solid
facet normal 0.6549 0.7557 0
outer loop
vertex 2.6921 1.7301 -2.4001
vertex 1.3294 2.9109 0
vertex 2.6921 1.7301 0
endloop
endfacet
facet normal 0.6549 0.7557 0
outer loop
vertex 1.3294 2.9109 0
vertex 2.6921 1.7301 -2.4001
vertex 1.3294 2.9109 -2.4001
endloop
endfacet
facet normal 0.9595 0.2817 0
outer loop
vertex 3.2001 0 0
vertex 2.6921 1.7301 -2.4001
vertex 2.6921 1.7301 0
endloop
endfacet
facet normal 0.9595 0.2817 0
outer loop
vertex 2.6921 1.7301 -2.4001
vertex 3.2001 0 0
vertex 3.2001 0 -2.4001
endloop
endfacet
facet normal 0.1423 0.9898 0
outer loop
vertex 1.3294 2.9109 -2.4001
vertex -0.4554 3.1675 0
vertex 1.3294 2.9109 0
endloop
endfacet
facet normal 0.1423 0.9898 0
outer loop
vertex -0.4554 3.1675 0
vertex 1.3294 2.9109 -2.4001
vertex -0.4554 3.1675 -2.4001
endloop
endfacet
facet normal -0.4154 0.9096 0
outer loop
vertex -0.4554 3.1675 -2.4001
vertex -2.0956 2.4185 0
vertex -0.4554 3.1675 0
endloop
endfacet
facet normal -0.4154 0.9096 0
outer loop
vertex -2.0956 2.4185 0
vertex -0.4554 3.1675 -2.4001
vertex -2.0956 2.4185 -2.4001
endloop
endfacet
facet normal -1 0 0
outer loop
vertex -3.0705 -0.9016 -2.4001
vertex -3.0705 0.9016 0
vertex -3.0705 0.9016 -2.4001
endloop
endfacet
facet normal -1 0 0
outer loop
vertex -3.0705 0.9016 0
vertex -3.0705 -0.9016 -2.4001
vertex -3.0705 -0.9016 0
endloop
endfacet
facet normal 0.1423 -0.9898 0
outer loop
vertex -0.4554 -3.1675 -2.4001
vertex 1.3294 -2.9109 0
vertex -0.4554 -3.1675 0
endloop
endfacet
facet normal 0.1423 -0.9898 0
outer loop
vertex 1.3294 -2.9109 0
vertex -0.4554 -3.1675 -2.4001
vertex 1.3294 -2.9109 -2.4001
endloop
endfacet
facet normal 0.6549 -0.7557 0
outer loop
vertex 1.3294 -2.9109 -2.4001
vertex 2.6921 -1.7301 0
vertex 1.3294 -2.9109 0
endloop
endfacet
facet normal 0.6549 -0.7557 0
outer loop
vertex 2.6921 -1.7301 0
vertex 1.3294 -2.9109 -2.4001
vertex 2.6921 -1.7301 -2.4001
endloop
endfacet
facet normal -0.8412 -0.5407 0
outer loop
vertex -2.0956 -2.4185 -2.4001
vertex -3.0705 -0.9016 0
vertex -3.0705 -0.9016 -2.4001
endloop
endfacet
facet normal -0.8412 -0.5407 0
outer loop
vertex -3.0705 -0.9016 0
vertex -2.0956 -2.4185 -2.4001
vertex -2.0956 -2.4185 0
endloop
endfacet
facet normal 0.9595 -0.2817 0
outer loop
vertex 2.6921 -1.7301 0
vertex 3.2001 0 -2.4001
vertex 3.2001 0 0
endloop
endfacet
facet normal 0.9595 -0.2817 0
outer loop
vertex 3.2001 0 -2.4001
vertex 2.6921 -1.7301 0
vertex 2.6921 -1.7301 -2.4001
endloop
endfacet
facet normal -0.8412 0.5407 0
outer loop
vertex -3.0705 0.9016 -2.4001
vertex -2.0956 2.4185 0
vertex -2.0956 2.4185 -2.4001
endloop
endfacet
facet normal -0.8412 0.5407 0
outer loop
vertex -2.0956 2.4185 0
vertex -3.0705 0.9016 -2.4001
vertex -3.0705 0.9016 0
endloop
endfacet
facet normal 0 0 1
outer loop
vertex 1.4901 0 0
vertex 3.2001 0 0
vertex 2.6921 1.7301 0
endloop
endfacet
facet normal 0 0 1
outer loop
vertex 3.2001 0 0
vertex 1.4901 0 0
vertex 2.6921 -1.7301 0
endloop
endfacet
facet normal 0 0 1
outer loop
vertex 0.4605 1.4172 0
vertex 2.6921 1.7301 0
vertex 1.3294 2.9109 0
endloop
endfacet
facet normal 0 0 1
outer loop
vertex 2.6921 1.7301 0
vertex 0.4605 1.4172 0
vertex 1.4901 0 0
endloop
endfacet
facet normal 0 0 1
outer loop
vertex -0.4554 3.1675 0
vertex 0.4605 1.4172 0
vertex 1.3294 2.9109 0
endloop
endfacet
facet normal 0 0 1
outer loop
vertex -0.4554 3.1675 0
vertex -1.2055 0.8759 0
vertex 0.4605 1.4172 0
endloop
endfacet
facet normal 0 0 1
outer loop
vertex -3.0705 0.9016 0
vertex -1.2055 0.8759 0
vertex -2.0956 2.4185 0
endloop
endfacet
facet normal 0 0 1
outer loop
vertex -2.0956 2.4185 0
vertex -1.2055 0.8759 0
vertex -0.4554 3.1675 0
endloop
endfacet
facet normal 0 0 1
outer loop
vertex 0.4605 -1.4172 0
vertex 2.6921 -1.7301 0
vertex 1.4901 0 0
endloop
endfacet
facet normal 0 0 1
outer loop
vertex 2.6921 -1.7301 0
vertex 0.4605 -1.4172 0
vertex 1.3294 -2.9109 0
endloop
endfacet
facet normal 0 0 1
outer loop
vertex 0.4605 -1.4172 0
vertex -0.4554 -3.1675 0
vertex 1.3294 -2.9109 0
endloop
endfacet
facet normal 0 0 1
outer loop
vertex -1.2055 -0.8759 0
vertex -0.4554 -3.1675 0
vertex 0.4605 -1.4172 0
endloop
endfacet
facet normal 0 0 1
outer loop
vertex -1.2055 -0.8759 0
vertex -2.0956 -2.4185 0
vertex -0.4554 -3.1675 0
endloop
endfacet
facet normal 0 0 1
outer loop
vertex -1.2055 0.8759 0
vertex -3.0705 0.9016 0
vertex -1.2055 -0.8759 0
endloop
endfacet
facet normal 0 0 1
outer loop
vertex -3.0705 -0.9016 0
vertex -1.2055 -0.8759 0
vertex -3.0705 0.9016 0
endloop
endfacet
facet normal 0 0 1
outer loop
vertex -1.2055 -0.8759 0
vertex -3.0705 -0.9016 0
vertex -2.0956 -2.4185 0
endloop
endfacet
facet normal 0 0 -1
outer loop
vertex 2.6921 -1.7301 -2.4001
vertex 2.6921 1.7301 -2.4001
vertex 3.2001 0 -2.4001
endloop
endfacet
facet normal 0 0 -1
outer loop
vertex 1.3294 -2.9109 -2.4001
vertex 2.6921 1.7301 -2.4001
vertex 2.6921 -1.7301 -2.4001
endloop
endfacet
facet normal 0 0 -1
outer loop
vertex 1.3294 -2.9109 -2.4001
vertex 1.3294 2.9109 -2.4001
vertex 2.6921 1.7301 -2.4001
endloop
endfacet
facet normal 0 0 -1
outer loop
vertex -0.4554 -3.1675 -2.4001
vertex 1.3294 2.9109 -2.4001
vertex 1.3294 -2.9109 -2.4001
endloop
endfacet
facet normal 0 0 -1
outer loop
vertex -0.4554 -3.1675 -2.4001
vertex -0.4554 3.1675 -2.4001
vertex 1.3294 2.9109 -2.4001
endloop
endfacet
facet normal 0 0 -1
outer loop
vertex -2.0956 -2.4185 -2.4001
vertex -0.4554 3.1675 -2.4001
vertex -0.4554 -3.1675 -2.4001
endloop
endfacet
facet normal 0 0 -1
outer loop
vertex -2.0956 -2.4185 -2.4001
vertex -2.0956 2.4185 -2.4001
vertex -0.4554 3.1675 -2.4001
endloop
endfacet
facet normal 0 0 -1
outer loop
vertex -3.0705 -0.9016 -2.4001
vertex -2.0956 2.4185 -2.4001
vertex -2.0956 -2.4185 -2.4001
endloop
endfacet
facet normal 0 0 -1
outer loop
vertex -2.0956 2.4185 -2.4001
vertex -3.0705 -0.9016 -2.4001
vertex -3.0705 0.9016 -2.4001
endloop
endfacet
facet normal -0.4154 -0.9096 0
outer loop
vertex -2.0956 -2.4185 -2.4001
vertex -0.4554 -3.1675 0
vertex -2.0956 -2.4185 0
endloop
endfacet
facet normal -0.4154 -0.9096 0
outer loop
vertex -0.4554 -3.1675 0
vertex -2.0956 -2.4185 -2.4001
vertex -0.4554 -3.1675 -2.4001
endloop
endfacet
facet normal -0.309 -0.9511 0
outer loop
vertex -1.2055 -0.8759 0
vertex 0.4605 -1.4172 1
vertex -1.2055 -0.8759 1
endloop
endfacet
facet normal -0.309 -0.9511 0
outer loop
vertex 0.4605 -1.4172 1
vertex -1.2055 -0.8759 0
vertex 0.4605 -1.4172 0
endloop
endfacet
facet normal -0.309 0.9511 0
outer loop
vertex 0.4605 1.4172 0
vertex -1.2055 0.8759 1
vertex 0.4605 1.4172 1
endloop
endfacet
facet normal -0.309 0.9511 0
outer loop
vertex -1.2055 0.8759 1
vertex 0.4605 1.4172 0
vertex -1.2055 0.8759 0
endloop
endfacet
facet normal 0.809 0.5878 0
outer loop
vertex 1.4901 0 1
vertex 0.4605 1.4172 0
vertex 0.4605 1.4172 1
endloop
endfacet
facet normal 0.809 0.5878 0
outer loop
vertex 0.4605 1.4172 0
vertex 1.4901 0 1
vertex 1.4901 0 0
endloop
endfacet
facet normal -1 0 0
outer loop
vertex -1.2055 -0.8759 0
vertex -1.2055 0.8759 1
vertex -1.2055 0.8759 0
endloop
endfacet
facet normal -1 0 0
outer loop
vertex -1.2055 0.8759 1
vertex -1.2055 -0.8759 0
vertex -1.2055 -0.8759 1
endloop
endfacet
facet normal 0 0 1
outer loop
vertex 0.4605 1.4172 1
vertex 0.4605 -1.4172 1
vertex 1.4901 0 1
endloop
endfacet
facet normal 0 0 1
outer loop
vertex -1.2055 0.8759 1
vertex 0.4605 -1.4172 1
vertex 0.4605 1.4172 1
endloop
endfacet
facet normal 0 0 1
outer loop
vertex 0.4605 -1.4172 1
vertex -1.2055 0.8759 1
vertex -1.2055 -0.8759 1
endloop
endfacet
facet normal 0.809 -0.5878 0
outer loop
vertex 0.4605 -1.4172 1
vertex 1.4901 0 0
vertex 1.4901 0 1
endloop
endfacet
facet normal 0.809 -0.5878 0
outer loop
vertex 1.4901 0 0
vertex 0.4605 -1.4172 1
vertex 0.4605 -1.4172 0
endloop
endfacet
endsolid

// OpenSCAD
// License: GPL 2.0

//testNutsAndBolts();

module testNutsAndBolts()
{
	$fn = 360;
	translate([0,15])nutHole(3, proj=2);
	boltHole(3, length= 30, proj=2);
}

MM = "mm";
INCH = "inch"; //Not yet supported

//Based on: http://www.roymech.co.uk/Useful_Tables/Screws/Hex_Screws.htm
METRIC_NUT_AC_WIDTHS = 
[
	-1, //0 index is not used but reduces computation
	-1,
	-1,
	6.40,//m3
	8.10,//m4
	9.20,//m5
	11.50,//m6
	-1,
	15.00,//m8
	-1,
	19.60,//m10
	-1,
	22.10,//m12
	-1,
	-1,
	-1,
	27.70,//m16
	-1,
	-1,
	-1,
	34.60,//m20
	-1,
	-1,
	-1,
	41.60,//m24
	-1,
	-1,
	-1,
	-1,
	-1,
	53.1,//m30
	-1,
	-1,
	-1,
	-1,
	-1,
	63.5//m36
];
METRIC_NUT_THICKNESS =
[
	-1, //0 index is not used but reduces computation
	-1,
	-1,
	2.40,//m3
	3.20,//m4
	4.00,//m5
	5.00,//m6
	-1,
	6.50,//m8
	-1,
	8.00,//m10
	-1,
	10.00,//m12
	-1,
	-1,
	-1,
	13.00,//m16
	-1,
	-1,
	-1,
	16.00//m20
	-1,
	-1,
	-1,
	19.00,//m24
	-1,
	-1,
	-1,
	-1,
	-1,
	24.00,//m30
	-1,
	-1,
	-1,
	-1,
	-1,
	29.00//m36
];

COURSE_METRIC_BOLT_MAJOR_THREAD_DIAMETERS = 
[//based on max values
	-1, //0 index is not used but reduces computation
	-1,
	-1,
	2.98,//m3
	3.978,//m4
	4.976,//m5
	5.974,//m6
	-1,
	7.972,//m8
	-1,
	9.968,//m10
	-1,
	11.966,//m12
	-1,
	-1,
	-1,
	15.962,//m16
	-1,
	-1,
	-1,
	19.958,//m20
	-1,
	-1,
	-1,
	23.952,//m24
	-1,
	-1,
	-1,
	-1,
	-1,
	29.947,//m30
	-1,
	-1,
	-1,
	-1,
	-1,
	35.940//m36
];

module nutHole(size, units=MM, tolerance = +0.0001, proj = -1)
{
	//takes a metric screw/nut size and looksup nut dimensions
	radius = METRIC_NUT_AC_WIDTHS[size]/2+tolerance;
	height = METRIC_NUT_THICKNESS[size]+tolerance;
	if (proj == -1)
	{
		cylinder(r= radius, h=height, $fn = 6, center=[0,0]);
	}
	if (proj == 1)
	{
		circle(r= radius, $fn = 6);
	}
	if (proj == 2)
	{
		translate([-radius/2, 0])
			square([radius*2, height]);
	}
}

module boltHole(size, units=MM, length, tolerance = +0.0001, proj = -1)
{
	radius = COURSE_METRIC_BOLT_MAJOR_THREAD_DIAMETERS[size]/2+tolerance;
//TODO: proper screw cap values
	capHeight = METRIC_NUT_THICKNESS[size]+tolerance; //METRIC_BOLT_CAP_HEIGHTS[size]+tolerance;
	capRadius = METRIC_NUT_AC_WIDTHS[size]/2+tolerance; //METRIC_BOLT_CAP_RADIUS[size]+tolerance;
	
	if (proj == -1)
	{
	translate([0, 0, -capHeight])
		cylinder(r= capRadius, h=capHeight);
	cylinder(r = radius, h = length);
	}
	if (proj == 1)
	{
		circle(r = radius);
	}
	if (proj == 2)
	{
		translate([-capRadius/2, -capHeight])
			square([capRadius*2, capHeight]);
		square([radius*2, length]);
	}
}
boltHole(3);
